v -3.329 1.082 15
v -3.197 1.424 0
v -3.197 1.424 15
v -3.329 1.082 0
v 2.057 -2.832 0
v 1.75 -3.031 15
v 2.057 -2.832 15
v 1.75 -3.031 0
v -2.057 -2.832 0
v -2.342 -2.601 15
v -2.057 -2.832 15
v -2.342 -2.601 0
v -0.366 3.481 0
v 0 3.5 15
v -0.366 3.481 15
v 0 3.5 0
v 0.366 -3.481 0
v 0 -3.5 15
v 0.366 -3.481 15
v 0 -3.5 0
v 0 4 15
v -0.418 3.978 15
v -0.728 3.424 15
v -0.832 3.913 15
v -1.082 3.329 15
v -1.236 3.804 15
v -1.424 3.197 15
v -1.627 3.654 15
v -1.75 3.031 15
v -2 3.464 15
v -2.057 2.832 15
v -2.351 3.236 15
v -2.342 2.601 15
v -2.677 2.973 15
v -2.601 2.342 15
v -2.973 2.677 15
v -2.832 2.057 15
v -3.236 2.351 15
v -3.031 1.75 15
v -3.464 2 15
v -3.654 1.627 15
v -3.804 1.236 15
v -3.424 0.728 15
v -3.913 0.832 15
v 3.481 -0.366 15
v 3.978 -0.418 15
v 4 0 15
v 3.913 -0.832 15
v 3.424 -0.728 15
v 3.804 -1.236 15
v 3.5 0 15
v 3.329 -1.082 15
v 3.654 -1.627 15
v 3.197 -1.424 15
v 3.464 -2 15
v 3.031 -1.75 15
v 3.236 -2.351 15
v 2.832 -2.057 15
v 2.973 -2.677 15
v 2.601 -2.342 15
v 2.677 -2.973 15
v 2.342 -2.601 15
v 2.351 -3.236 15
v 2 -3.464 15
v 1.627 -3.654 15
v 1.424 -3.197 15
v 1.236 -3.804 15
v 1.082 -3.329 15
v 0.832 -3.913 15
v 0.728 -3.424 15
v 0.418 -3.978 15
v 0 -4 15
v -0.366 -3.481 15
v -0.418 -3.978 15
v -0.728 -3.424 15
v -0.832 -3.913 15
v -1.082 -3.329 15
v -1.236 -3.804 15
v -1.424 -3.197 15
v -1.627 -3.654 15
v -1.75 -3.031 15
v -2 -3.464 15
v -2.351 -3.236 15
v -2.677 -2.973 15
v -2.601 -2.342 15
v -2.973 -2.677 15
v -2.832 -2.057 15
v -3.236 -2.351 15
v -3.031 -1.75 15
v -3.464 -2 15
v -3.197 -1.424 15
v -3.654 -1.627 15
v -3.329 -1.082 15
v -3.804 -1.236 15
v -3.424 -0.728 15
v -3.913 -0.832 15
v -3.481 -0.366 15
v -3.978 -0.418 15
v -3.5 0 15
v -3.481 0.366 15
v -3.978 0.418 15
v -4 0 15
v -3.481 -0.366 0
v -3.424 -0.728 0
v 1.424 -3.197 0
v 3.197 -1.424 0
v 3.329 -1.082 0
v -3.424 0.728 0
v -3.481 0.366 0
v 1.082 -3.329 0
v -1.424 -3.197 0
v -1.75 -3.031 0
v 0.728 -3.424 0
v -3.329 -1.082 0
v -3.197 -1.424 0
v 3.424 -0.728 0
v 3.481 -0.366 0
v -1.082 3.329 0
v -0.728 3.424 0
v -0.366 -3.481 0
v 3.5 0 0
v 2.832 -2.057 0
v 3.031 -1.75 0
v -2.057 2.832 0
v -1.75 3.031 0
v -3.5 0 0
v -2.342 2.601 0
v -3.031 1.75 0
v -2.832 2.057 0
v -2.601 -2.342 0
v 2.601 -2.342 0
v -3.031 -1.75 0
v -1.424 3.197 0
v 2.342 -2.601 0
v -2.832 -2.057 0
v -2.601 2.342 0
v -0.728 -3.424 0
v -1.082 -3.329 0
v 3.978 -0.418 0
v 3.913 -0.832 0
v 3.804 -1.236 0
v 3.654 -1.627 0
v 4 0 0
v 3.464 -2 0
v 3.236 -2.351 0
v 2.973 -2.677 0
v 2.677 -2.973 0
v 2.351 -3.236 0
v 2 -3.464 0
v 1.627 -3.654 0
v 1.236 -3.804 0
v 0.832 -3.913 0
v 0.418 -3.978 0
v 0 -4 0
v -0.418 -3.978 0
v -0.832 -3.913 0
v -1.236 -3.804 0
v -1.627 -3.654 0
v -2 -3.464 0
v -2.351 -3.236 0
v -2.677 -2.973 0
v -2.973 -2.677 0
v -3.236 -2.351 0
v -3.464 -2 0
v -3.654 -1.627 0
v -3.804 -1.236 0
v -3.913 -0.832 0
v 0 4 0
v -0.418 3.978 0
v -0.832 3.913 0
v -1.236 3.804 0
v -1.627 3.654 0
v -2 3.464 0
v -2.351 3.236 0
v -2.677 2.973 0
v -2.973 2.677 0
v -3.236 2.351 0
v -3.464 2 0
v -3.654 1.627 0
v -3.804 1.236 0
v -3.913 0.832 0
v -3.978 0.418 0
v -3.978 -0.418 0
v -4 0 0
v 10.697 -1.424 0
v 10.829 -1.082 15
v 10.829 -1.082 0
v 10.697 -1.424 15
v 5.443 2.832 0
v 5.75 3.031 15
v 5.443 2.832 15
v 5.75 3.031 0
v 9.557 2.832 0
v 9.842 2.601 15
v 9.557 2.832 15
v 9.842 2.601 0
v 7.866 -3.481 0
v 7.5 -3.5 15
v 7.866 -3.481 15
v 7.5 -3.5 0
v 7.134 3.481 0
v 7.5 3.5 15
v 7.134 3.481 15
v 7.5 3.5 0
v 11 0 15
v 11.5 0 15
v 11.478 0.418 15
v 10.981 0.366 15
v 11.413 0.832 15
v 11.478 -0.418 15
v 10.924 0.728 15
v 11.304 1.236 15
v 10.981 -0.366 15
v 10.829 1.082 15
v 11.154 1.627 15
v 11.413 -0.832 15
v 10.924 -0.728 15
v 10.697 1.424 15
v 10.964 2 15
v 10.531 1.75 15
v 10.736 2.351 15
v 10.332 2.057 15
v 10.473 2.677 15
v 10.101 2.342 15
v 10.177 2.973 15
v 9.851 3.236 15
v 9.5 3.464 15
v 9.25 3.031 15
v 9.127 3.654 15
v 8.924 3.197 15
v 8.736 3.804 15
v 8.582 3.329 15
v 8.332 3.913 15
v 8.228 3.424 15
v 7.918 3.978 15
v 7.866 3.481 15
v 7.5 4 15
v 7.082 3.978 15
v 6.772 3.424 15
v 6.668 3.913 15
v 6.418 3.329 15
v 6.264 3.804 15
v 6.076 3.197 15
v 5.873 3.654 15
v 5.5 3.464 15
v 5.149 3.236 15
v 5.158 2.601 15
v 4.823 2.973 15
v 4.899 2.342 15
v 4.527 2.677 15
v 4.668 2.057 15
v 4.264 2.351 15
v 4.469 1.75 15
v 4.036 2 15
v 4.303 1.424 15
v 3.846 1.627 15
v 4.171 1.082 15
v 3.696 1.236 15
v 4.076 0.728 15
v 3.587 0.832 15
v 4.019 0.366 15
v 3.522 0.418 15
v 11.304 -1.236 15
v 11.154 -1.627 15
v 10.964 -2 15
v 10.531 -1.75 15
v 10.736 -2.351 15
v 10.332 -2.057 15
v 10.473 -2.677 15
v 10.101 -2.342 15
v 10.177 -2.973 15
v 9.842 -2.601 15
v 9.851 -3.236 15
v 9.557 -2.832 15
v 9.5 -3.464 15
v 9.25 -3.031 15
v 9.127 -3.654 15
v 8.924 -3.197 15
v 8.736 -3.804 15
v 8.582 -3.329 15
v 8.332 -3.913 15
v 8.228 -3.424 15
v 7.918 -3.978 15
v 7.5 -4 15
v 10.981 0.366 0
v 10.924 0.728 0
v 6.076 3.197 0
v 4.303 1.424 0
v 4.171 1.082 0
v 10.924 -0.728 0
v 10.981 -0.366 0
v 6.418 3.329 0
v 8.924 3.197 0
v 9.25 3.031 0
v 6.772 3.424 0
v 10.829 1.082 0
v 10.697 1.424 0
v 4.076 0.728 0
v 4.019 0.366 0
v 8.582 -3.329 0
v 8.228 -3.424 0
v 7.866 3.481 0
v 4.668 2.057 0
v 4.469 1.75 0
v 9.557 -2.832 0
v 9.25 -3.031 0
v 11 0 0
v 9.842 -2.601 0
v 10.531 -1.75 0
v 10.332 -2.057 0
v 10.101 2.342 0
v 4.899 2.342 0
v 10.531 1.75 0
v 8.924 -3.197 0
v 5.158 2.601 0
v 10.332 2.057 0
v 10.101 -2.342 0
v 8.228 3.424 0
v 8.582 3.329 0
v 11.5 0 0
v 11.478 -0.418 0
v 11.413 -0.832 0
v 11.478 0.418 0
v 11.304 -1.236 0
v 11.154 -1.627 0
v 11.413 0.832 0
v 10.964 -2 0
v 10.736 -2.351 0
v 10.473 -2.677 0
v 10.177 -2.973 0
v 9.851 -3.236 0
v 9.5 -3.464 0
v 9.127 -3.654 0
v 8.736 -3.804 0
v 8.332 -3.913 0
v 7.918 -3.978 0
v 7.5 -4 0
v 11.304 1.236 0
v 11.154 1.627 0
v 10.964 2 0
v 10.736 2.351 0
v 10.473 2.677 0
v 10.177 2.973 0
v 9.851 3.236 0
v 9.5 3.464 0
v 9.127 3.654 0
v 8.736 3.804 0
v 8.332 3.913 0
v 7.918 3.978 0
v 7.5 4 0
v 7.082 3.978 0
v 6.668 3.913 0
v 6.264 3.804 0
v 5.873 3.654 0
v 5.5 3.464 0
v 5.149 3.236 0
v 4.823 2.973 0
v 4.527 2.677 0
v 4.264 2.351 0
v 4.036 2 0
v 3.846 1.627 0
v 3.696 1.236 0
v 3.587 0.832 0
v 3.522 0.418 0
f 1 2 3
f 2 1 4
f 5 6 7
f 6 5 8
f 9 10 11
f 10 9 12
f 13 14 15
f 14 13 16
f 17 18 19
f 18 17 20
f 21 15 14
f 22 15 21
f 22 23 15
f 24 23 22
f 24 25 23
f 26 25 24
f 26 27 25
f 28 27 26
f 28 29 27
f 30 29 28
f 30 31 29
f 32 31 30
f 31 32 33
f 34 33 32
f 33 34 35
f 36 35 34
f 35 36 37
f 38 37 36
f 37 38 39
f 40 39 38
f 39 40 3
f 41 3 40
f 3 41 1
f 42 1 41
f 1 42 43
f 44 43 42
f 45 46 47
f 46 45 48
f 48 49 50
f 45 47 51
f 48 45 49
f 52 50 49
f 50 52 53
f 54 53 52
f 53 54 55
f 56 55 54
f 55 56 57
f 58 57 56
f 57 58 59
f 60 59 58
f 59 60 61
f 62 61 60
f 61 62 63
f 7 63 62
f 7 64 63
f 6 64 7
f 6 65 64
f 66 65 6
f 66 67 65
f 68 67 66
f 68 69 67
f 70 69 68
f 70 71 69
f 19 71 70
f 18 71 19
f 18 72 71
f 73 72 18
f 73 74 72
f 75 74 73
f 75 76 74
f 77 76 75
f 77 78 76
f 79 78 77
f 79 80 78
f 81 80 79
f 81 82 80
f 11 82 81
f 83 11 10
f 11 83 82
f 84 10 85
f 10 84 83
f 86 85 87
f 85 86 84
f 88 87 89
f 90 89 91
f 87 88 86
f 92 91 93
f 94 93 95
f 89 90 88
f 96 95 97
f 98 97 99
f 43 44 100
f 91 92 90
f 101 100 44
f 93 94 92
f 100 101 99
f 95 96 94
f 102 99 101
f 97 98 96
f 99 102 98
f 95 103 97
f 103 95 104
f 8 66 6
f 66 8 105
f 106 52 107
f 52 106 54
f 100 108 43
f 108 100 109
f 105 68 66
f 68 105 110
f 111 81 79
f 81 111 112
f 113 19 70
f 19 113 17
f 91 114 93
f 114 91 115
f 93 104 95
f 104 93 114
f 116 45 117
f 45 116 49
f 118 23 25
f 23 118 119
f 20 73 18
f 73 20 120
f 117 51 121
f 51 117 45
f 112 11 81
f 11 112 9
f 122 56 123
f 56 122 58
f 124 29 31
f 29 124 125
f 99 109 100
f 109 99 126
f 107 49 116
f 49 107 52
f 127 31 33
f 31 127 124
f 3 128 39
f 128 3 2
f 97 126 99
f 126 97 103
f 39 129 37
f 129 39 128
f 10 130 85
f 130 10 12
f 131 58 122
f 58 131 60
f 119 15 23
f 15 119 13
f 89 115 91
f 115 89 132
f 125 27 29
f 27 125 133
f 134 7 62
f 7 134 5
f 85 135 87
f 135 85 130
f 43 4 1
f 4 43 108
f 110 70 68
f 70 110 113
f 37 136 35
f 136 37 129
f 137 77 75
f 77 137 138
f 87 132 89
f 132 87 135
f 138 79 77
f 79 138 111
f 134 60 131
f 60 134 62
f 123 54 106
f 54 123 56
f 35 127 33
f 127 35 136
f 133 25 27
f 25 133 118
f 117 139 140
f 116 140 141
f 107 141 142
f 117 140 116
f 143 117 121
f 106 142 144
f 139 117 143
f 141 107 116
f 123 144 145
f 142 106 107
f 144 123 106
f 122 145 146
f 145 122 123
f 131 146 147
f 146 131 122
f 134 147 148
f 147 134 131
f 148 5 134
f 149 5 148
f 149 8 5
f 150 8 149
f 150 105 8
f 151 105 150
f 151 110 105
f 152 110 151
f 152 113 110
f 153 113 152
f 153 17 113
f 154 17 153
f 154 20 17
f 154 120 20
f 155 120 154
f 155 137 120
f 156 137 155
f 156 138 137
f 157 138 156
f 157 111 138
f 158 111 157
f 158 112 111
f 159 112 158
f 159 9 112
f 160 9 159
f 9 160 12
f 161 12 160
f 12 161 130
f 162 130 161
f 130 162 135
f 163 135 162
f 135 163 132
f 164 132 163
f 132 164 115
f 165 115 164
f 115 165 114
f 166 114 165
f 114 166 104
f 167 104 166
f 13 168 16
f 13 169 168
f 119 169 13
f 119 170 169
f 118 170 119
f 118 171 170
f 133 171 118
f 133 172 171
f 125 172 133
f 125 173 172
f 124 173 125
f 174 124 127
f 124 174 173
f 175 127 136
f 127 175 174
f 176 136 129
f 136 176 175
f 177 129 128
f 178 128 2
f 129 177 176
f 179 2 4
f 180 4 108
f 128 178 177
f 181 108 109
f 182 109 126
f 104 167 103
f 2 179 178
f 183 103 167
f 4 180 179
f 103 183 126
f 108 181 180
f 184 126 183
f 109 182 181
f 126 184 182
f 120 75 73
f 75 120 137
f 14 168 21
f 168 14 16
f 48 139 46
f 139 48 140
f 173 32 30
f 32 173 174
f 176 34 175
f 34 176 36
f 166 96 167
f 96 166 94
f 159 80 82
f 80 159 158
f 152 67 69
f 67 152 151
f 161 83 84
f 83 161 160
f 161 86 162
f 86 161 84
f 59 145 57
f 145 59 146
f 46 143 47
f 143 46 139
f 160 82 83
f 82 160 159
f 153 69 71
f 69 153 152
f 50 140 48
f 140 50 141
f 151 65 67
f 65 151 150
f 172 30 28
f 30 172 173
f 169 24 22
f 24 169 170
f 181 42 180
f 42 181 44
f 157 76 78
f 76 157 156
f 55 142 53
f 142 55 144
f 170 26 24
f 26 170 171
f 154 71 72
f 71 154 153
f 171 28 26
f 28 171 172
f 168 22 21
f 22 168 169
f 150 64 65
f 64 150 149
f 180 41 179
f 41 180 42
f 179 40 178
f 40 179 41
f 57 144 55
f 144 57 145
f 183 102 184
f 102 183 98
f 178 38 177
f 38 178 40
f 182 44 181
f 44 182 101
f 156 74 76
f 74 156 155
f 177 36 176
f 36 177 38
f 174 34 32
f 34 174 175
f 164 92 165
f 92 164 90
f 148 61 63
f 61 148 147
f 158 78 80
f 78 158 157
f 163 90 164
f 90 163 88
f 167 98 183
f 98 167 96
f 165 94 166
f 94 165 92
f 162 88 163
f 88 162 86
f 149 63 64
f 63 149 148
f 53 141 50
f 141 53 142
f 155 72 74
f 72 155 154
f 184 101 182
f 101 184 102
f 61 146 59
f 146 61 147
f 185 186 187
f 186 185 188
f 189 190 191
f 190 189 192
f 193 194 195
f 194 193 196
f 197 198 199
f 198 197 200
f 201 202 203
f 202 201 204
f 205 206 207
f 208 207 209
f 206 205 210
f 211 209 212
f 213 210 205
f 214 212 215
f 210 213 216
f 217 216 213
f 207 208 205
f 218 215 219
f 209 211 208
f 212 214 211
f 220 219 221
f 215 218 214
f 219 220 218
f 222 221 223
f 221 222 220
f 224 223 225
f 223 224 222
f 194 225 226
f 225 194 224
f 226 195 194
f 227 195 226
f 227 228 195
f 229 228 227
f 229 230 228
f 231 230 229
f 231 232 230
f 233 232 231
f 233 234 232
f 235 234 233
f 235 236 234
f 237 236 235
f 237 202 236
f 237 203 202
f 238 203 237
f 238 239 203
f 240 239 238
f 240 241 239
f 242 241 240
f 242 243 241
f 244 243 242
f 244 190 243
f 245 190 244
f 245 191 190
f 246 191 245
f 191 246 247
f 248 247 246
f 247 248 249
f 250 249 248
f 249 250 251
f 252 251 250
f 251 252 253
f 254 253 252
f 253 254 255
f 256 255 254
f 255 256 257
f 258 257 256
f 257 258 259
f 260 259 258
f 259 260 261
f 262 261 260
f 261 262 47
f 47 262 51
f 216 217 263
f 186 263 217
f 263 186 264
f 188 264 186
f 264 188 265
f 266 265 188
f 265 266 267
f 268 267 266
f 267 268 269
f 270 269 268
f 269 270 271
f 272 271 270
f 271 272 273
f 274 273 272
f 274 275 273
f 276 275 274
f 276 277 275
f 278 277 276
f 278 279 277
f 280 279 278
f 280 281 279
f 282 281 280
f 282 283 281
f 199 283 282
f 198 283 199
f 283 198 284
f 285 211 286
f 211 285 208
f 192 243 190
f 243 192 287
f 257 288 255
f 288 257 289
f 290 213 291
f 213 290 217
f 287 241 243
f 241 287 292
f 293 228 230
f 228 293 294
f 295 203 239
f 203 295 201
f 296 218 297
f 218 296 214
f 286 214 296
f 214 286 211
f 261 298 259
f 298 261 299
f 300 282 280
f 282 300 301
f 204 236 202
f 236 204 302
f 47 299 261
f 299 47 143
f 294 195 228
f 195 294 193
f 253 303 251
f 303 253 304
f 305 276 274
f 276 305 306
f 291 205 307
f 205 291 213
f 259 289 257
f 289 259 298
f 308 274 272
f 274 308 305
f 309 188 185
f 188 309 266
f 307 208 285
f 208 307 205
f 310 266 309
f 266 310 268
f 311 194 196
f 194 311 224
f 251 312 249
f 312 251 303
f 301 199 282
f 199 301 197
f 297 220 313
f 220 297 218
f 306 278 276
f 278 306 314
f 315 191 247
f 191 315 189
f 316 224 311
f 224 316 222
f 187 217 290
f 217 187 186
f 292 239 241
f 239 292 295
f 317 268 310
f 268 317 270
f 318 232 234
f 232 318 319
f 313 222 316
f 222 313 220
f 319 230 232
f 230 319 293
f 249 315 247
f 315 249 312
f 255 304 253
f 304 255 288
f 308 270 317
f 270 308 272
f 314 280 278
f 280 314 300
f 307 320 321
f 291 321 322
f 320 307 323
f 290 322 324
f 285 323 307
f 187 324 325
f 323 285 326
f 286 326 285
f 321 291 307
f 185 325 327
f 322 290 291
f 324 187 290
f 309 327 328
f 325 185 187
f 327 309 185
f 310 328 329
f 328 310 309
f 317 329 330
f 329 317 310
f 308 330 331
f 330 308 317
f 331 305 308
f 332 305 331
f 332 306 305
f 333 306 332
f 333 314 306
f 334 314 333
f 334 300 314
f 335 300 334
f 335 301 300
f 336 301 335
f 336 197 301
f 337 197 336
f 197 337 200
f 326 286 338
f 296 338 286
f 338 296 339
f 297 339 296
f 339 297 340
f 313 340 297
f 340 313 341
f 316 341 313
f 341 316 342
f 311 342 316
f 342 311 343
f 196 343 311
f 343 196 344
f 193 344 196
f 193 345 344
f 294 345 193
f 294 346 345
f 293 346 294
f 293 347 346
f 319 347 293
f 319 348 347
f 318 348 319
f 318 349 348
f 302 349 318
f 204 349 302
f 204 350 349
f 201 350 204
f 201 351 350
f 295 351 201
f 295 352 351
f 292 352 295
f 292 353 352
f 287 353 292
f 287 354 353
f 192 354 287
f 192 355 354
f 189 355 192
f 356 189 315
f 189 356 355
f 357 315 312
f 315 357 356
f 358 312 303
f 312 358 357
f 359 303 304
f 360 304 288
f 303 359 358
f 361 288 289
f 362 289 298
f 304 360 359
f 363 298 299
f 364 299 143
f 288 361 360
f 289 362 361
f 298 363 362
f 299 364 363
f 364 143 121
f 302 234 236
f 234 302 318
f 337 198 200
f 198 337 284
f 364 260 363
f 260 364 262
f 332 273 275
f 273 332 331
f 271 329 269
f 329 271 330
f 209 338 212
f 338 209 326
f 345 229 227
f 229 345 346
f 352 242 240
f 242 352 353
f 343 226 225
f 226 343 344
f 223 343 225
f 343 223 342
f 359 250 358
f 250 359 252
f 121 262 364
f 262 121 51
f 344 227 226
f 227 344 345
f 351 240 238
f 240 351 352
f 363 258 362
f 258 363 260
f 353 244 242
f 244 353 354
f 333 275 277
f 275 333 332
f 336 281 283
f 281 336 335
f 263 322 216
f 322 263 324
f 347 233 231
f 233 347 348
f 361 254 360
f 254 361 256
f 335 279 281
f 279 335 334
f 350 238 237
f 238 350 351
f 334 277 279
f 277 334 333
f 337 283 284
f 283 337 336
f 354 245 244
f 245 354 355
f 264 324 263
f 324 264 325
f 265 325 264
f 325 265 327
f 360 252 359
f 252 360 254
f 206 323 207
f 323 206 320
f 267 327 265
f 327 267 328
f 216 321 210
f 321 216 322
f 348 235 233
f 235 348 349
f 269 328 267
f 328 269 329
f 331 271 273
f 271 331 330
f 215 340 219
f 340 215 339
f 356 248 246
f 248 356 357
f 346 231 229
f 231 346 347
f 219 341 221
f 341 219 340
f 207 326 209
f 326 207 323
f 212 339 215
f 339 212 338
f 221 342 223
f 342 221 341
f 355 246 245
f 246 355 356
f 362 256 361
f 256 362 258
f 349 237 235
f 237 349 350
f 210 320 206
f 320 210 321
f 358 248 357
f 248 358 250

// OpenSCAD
$fn = 60;
outerRad = 4.0;
innerRad = 3.5;
height = 15.0;

// 3/4 cylinder
module c1() {
	difference() {
		cylinder(r=outerRad, h=height);
		union() { 
			cylinder(r=innerRad, h=height);
			cube(size=[outerRad, outerRad, height]); 
		}
	}
}

//
module c2() {
	translate([outerRad+innerRad, 0, 0]) rotate(a=180) c1();
}

module oneLink() {
	union() {
		c1();
		c2();
	}
}
oneLink();
